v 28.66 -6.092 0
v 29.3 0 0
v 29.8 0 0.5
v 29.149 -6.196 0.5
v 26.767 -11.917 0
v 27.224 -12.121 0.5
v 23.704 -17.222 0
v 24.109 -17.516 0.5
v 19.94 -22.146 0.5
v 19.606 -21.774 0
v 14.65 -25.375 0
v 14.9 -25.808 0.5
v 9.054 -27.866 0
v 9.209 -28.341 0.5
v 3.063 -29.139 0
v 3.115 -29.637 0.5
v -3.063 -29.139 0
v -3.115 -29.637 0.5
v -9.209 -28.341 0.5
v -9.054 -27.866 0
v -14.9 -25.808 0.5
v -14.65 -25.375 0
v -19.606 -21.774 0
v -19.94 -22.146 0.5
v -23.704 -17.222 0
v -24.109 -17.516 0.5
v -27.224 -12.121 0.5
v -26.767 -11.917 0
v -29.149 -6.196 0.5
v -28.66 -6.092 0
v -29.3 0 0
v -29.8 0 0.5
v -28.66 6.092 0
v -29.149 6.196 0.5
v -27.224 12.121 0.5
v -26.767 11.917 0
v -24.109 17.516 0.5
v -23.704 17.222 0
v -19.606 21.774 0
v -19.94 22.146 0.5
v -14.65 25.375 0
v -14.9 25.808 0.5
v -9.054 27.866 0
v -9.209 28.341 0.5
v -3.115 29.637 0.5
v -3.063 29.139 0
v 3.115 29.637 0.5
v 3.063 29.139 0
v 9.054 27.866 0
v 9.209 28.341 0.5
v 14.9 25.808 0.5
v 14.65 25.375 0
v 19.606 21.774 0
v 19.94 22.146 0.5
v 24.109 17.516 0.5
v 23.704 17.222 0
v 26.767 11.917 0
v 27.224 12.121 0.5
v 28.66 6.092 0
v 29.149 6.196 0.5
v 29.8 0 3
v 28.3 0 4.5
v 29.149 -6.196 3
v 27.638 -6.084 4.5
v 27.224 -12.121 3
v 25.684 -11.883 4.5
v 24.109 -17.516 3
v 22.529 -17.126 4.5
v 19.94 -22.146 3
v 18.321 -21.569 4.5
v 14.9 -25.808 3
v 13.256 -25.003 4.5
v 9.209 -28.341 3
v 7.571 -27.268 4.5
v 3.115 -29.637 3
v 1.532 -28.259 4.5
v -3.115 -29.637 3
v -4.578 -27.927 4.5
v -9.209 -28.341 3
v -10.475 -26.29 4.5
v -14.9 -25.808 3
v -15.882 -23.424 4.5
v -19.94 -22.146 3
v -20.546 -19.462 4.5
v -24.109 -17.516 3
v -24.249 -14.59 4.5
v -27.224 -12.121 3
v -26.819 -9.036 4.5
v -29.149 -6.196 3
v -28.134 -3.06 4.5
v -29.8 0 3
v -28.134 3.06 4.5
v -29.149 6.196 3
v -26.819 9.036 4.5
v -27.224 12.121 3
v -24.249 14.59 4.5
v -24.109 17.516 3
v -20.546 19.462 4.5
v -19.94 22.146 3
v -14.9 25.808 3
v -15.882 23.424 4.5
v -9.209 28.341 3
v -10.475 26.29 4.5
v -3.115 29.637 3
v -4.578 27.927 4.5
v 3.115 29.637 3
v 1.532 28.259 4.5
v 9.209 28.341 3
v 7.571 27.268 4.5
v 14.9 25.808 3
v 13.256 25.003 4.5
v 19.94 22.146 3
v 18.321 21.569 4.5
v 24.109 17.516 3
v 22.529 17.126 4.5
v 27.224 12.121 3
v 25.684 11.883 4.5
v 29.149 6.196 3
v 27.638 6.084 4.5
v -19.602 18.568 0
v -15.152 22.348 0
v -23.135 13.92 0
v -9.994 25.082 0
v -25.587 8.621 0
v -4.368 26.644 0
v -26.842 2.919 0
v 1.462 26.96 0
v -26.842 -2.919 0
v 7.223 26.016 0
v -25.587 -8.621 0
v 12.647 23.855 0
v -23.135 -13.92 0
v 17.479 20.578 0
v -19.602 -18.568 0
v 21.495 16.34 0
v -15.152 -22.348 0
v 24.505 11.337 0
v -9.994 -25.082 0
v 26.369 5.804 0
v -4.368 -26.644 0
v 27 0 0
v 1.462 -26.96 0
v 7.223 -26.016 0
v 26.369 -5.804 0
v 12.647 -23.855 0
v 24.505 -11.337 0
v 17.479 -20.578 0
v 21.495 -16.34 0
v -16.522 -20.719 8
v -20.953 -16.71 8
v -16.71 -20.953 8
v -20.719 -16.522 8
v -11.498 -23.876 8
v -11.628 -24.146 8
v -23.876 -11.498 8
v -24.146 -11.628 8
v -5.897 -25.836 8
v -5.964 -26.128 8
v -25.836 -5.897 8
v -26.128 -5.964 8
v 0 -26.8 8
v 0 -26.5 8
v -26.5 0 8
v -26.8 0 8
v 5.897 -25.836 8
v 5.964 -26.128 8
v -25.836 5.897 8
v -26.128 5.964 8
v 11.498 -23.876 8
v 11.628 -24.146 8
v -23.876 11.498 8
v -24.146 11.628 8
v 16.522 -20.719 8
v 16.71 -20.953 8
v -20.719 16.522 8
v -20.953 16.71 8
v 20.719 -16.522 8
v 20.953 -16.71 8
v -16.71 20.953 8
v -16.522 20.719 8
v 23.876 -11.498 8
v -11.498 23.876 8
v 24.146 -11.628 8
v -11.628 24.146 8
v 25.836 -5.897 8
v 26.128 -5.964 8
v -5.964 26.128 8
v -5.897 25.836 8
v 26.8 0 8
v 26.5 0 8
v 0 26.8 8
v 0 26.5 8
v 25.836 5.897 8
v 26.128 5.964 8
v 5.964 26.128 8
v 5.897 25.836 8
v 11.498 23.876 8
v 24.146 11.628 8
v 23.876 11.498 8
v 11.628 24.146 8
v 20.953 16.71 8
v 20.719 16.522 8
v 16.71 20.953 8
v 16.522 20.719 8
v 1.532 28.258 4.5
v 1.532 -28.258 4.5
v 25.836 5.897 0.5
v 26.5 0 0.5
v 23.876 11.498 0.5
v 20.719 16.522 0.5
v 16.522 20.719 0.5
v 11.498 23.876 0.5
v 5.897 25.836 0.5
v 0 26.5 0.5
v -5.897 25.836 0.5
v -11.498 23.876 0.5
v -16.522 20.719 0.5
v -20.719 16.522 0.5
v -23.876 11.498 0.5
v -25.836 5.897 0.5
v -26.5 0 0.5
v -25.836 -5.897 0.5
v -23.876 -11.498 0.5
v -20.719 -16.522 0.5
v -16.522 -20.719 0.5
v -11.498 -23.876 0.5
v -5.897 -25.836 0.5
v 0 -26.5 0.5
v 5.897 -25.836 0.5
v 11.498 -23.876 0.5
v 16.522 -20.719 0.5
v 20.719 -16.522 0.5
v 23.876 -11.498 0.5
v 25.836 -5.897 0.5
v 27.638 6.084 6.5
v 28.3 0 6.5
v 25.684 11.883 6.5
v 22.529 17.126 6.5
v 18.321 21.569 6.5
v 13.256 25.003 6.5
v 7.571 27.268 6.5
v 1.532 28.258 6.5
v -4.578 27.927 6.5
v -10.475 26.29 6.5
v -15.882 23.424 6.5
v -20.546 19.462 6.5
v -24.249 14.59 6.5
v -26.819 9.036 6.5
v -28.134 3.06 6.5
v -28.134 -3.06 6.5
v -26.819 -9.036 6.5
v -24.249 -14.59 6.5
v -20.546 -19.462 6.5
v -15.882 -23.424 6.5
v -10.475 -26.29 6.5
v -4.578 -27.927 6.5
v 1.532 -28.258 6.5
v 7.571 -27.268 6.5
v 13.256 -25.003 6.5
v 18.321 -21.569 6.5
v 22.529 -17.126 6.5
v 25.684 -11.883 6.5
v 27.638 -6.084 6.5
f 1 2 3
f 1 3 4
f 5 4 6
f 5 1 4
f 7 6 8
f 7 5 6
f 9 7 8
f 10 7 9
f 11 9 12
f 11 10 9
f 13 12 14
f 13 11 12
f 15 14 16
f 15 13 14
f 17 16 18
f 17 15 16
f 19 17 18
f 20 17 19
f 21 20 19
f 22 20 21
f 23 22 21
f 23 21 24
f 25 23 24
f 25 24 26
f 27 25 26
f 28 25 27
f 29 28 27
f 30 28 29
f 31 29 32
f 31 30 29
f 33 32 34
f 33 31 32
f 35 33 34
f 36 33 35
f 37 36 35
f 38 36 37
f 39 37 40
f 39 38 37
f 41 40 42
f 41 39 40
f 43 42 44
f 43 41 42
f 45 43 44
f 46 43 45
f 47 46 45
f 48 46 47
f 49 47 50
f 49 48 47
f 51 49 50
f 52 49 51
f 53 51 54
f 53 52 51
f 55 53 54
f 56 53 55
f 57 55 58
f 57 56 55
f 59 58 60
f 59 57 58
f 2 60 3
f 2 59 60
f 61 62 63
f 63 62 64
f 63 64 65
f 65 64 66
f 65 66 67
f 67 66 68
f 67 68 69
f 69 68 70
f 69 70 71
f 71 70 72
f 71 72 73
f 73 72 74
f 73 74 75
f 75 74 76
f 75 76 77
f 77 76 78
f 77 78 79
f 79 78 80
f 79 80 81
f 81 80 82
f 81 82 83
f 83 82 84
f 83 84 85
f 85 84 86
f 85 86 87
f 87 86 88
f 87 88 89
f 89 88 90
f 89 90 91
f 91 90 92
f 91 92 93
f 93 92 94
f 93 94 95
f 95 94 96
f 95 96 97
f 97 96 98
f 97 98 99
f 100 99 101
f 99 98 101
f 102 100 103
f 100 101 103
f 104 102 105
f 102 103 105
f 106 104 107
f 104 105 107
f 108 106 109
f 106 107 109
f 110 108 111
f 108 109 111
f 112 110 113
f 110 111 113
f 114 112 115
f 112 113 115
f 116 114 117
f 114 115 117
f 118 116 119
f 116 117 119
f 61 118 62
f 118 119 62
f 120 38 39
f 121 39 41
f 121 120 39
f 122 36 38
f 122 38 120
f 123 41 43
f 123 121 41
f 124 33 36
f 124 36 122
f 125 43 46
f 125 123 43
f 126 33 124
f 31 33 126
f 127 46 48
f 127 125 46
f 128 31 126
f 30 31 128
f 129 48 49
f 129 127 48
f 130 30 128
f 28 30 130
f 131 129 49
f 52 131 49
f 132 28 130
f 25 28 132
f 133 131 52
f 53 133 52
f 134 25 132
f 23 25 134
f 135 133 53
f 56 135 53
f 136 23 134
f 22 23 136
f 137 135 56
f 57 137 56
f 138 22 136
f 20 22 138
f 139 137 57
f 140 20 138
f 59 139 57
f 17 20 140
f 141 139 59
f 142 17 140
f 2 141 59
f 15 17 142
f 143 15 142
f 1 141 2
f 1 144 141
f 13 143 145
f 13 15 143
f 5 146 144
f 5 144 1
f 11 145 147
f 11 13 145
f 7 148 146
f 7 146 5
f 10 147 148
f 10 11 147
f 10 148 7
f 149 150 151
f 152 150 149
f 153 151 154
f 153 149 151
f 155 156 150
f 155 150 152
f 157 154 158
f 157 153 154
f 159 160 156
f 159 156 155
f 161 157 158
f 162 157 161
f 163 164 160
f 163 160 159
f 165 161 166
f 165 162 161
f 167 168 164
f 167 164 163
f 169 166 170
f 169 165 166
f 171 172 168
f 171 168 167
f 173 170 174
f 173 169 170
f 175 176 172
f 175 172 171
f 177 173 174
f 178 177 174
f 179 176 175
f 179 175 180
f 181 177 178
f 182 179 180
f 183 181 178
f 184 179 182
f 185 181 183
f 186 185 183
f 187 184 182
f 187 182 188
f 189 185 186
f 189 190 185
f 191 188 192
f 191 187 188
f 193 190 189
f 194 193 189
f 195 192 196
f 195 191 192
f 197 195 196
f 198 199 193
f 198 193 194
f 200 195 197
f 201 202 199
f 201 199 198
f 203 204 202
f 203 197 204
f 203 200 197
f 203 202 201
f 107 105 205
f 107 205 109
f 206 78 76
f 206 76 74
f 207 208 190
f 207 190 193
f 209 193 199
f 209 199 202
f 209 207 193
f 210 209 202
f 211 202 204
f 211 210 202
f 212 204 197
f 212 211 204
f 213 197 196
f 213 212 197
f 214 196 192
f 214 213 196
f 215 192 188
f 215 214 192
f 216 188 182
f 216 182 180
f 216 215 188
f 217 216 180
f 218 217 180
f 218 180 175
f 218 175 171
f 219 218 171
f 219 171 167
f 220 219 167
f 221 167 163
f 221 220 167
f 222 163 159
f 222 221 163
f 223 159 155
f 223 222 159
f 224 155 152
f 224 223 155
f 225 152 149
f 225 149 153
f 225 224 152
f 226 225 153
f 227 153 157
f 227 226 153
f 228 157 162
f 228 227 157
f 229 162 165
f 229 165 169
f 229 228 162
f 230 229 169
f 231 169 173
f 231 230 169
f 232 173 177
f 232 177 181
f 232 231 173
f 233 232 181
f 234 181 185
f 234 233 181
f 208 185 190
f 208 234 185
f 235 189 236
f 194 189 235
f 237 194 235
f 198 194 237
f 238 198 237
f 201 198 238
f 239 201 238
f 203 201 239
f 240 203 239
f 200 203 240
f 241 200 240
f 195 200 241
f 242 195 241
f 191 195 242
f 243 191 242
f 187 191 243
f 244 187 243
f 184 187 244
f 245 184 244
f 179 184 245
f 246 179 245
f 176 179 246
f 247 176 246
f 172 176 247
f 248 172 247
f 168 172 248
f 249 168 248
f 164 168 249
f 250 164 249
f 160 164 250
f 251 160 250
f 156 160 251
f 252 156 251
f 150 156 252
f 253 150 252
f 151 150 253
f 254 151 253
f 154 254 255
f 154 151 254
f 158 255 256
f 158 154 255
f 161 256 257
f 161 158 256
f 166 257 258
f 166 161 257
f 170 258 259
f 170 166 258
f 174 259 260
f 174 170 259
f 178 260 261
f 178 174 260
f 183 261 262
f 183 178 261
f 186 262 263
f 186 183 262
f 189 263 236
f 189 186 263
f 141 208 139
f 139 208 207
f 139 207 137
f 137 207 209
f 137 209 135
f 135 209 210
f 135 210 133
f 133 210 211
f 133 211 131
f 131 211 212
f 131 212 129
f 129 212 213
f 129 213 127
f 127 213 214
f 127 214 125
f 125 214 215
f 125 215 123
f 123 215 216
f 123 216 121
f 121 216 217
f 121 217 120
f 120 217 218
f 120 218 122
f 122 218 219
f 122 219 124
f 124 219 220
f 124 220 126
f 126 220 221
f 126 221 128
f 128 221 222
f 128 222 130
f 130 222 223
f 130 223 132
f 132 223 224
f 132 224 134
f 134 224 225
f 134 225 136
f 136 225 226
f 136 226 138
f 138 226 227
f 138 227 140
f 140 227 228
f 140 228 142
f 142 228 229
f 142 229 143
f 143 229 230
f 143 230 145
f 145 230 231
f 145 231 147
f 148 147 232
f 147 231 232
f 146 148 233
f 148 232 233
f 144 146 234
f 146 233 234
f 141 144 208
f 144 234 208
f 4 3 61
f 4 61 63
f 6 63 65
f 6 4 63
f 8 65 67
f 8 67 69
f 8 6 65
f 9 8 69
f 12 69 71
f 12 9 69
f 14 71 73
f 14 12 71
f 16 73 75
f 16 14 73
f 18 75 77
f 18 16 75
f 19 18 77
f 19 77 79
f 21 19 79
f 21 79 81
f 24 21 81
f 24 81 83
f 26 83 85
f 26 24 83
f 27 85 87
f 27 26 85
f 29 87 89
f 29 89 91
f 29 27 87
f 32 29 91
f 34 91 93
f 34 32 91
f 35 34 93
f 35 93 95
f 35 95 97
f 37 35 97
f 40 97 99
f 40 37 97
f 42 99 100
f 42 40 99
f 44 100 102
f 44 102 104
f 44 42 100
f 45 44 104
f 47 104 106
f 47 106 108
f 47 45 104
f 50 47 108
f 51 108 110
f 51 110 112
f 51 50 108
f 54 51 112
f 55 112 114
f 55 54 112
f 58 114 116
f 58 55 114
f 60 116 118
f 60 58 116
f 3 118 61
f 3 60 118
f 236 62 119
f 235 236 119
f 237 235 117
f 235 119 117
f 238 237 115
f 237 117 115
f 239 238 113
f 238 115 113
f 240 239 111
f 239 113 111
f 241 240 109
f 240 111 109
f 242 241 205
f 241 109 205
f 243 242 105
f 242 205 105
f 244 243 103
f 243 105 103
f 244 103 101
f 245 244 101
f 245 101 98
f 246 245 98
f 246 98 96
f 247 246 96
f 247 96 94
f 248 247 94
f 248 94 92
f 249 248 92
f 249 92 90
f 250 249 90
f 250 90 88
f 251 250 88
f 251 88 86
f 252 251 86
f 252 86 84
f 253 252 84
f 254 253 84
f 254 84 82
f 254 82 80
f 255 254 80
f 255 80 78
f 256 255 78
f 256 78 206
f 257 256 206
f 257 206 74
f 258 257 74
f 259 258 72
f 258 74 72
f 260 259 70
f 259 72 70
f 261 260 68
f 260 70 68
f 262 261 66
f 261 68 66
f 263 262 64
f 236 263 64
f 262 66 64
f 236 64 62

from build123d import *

# Parameters (mm, degrees)
F0_R     = 28.3
F0_R_2   = 26.5
F1_DEPTH = 8
F2_SIZE  = 1.5
F3_SIZE  = 0.5
F4_R     = 29.8
F4_R_2   = 28.3
F5_DEPTH = 4.5
F6_SIZE  = 1.49999
F7_SIZE  = 0.5


# Not quite as in the source:
# - a fillet or chamfer is up to 0.001 mm smaller than in the source, because OpenCascade refuses the exact size


with BuildPart() as f1:
    # F0 (on Top) → F1 (new body)
    with BuildSketch(Plane.XY):
        Circle(F0_R)
        Circle(F0_R_2, mode=Mode.SUBTRACT)
    extrude(amount=F1_DEPTH)

    # F2
    f2_edges = [f1.edges().sort_by_distance(p)[0] for p in [
        (-28.3, 0, 8),
    ]]
    chamfer(f2_edges, length=F2_SIZE)

    # F3
    f3_edges = [f1.edges().sort_by_distance(p)[0] for p in [
        (-26.5, 0, 0),
    ]]
    chamfer(f3_edges, length=F3_SIZE)

    # F4 (on face) → F5 (join)
    with BuildSketch(Plane(origin=(0, 0, 0), x_dir=(1, 0, 0), z_dir=(0, 0, -1))):
        Circle(F4_R)
        Circle(F4_R_2, mode=Mode.SUBTRACT)
    extrude(amount=-F5_DEPTH)

    # F6 (size 1.5 in the source; OpenCascade refuses exactly that, so slightly less here)
    f6_edges = [f1.edges().sort_by_distance(p)[0] for p in [
        (-29.8, 0, 4.5),
    ]]
    chamfer(f6_edges, length=F6_SIZE)

    # F7
    f7_edges = [f1.edges().sort_by_distance(p)[0] for p in [
        (-29.8, 0, 0),
    ]]
    chamfer(f7_edges, length=F7_SIZE)


solid = f1.part
